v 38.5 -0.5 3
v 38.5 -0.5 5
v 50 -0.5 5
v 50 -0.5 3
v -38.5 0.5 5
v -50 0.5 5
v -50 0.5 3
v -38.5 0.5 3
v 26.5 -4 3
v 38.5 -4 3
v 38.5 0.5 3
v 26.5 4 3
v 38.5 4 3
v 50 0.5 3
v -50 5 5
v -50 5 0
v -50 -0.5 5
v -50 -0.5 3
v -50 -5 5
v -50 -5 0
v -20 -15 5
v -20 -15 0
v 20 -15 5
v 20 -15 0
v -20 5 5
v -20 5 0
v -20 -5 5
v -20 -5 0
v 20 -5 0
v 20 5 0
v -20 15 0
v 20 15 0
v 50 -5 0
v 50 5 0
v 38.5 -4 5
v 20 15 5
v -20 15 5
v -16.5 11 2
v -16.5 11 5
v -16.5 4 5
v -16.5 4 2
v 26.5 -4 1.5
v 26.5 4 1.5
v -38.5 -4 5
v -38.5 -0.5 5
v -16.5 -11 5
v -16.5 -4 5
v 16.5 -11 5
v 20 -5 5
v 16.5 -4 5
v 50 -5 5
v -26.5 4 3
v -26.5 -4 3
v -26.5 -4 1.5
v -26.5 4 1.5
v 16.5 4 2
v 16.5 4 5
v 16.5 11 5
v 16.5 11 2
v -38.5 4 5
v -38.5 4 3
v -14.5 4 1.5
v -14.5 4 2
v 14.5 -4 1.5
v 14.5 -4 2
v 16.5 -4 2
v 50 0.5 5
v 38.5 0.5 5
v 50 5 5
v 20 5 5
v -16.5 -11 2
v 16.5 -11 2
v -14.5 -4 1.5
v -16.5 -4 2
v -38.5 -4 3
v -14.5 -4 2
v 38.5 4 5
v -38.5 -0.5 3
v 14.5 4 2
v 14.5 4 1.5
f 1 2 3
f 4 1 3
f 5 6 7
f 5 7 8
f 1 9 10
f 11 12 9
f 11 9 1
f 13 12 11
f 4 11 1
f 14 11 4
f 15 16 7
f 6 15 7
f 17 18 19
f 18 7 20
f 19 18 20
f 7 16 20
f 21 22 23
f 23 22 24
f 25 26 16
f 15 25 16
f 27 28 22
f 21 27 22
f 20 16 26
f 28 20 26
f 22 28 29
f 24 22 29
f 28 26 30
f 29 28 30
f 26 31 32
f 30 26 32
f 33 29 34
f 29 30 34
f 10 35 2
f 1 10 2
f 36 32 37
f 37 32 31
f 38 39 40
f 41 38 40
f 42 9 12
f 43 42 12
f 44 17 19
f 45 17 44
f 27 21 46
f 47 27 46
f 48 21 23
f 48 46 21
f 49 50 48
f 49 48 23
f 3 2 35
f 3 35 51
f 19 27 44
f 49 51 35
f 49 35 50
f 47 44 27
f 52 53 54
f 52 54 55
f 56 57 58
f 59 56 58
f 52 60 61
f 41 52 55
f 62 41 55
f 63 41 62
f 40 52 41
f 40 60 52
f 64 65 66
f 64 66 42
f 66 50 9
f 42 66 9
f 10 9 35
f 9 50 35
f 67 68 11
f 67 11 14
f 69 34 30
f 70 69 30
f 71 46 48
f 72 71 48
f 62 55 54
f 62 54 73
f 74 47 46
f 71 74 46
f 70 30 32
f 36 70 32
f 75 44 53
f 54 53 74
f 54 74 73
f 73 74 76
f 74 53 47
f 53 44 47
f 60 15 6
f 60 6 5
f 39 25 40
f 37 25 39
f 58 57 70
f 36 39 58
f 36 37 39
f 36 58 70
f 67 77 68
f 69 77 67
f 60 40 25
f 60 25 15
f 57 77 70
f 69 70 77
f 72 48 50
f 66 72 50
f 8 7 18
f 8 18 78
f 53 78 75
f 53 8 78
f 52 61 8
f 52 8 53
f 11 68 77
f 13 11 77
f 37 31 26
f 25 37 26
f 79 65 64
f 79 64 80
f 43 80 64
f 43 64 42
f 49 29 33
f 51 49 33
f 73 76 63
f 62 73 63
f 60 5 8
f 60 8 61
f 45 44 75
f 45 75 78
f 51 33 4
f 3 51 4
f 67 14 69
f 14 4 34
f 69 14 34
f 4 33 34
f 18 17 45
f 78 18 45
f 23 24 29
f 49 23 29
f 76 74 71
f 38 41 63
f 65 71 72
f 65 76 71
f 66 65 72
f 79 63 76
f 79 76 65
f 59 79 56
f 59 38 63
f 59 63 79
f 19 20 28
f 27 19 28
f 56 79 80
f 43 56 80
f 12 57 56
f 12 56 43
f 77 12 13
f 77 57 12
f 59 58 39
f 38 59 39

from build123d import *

# Parameters (mm, degrees)
F1_DEPTH = 5
F3_DEPTH = 3
F4_W     = 12
F4_H     = 8
F5_DEPTH = 3.5
F6_W     = 12
F6_H     = 8
F7_DEPTH = 2
F8_W     = 11.5
F8_H     = 1
F9_DEPTH = 2


with BuildPart() as f1:
    # F0 (on Top) → F1 (new body)
    with BuildSketch(Plane.XY):
        Polygon((-20, -5), (-20, -15), (20, -15), (20, -5), (50, -5), (50, 5), (20, 5), (20, 15), (-20, 15), (-20, 5), (-50, 5), (-50, -5), align=None)
    extrude(amount=F1_DEPTH)

    # F2 (on face) → F3 (cut)
    with BuildSketch(Plane.XY.offset(5)):
        Polygon((16.5, 11), (-16.5, 11), (-16.5, 4), (-14.5, 4), (-14.5, -4), (-16.5, -4), (-16.5, -11), (16.5, -11), (16.5, -4), (14.5, -4), (14.5, 4), (16.5, 4), align=None)
    extrude(amount=-F3_DEPTH, mode=Mode.SUBTRACT)

    # F4 (on face) → F5 (cut)
    with BuildSketch(Plane.XY.offset(5)):
        with Locations((-20.5, 0)):
            Rectangle(F4_W, F4_H)
        with Locations((20.5, 0)):
            Rectangle(F4_W, F4_H)
    extrude(amount=-F5_DEPTH, mode=Mode.SUBTRACT)

    # F6 (on face) → F7 (cut)
    with BuildSketch(Plane.XY.offset(5)):
        with Locations((-32.5, 0)):
            Rectangle(F6_W, F6_H)
        with Locations((32.5, 0)):
            Rectangle(F6_W, F6_H)
    extrude(amount=-F7_DEPTH, mode=Mode.SUBTRACT)

    # F8 (on face) → F9 (cut)
    with BuildSketch(Plane.XY.offset(5)):
        with Locations((-44.25, 0)):
            Rectangle(F8_W, F8_H)
        with Locations((44.25, 0)):
            Rectangle(F8_W, F8_H)
    extrude(amount=-F9_DEPTH, mode=Mode.SUBTRACT)


solid = f1.part
